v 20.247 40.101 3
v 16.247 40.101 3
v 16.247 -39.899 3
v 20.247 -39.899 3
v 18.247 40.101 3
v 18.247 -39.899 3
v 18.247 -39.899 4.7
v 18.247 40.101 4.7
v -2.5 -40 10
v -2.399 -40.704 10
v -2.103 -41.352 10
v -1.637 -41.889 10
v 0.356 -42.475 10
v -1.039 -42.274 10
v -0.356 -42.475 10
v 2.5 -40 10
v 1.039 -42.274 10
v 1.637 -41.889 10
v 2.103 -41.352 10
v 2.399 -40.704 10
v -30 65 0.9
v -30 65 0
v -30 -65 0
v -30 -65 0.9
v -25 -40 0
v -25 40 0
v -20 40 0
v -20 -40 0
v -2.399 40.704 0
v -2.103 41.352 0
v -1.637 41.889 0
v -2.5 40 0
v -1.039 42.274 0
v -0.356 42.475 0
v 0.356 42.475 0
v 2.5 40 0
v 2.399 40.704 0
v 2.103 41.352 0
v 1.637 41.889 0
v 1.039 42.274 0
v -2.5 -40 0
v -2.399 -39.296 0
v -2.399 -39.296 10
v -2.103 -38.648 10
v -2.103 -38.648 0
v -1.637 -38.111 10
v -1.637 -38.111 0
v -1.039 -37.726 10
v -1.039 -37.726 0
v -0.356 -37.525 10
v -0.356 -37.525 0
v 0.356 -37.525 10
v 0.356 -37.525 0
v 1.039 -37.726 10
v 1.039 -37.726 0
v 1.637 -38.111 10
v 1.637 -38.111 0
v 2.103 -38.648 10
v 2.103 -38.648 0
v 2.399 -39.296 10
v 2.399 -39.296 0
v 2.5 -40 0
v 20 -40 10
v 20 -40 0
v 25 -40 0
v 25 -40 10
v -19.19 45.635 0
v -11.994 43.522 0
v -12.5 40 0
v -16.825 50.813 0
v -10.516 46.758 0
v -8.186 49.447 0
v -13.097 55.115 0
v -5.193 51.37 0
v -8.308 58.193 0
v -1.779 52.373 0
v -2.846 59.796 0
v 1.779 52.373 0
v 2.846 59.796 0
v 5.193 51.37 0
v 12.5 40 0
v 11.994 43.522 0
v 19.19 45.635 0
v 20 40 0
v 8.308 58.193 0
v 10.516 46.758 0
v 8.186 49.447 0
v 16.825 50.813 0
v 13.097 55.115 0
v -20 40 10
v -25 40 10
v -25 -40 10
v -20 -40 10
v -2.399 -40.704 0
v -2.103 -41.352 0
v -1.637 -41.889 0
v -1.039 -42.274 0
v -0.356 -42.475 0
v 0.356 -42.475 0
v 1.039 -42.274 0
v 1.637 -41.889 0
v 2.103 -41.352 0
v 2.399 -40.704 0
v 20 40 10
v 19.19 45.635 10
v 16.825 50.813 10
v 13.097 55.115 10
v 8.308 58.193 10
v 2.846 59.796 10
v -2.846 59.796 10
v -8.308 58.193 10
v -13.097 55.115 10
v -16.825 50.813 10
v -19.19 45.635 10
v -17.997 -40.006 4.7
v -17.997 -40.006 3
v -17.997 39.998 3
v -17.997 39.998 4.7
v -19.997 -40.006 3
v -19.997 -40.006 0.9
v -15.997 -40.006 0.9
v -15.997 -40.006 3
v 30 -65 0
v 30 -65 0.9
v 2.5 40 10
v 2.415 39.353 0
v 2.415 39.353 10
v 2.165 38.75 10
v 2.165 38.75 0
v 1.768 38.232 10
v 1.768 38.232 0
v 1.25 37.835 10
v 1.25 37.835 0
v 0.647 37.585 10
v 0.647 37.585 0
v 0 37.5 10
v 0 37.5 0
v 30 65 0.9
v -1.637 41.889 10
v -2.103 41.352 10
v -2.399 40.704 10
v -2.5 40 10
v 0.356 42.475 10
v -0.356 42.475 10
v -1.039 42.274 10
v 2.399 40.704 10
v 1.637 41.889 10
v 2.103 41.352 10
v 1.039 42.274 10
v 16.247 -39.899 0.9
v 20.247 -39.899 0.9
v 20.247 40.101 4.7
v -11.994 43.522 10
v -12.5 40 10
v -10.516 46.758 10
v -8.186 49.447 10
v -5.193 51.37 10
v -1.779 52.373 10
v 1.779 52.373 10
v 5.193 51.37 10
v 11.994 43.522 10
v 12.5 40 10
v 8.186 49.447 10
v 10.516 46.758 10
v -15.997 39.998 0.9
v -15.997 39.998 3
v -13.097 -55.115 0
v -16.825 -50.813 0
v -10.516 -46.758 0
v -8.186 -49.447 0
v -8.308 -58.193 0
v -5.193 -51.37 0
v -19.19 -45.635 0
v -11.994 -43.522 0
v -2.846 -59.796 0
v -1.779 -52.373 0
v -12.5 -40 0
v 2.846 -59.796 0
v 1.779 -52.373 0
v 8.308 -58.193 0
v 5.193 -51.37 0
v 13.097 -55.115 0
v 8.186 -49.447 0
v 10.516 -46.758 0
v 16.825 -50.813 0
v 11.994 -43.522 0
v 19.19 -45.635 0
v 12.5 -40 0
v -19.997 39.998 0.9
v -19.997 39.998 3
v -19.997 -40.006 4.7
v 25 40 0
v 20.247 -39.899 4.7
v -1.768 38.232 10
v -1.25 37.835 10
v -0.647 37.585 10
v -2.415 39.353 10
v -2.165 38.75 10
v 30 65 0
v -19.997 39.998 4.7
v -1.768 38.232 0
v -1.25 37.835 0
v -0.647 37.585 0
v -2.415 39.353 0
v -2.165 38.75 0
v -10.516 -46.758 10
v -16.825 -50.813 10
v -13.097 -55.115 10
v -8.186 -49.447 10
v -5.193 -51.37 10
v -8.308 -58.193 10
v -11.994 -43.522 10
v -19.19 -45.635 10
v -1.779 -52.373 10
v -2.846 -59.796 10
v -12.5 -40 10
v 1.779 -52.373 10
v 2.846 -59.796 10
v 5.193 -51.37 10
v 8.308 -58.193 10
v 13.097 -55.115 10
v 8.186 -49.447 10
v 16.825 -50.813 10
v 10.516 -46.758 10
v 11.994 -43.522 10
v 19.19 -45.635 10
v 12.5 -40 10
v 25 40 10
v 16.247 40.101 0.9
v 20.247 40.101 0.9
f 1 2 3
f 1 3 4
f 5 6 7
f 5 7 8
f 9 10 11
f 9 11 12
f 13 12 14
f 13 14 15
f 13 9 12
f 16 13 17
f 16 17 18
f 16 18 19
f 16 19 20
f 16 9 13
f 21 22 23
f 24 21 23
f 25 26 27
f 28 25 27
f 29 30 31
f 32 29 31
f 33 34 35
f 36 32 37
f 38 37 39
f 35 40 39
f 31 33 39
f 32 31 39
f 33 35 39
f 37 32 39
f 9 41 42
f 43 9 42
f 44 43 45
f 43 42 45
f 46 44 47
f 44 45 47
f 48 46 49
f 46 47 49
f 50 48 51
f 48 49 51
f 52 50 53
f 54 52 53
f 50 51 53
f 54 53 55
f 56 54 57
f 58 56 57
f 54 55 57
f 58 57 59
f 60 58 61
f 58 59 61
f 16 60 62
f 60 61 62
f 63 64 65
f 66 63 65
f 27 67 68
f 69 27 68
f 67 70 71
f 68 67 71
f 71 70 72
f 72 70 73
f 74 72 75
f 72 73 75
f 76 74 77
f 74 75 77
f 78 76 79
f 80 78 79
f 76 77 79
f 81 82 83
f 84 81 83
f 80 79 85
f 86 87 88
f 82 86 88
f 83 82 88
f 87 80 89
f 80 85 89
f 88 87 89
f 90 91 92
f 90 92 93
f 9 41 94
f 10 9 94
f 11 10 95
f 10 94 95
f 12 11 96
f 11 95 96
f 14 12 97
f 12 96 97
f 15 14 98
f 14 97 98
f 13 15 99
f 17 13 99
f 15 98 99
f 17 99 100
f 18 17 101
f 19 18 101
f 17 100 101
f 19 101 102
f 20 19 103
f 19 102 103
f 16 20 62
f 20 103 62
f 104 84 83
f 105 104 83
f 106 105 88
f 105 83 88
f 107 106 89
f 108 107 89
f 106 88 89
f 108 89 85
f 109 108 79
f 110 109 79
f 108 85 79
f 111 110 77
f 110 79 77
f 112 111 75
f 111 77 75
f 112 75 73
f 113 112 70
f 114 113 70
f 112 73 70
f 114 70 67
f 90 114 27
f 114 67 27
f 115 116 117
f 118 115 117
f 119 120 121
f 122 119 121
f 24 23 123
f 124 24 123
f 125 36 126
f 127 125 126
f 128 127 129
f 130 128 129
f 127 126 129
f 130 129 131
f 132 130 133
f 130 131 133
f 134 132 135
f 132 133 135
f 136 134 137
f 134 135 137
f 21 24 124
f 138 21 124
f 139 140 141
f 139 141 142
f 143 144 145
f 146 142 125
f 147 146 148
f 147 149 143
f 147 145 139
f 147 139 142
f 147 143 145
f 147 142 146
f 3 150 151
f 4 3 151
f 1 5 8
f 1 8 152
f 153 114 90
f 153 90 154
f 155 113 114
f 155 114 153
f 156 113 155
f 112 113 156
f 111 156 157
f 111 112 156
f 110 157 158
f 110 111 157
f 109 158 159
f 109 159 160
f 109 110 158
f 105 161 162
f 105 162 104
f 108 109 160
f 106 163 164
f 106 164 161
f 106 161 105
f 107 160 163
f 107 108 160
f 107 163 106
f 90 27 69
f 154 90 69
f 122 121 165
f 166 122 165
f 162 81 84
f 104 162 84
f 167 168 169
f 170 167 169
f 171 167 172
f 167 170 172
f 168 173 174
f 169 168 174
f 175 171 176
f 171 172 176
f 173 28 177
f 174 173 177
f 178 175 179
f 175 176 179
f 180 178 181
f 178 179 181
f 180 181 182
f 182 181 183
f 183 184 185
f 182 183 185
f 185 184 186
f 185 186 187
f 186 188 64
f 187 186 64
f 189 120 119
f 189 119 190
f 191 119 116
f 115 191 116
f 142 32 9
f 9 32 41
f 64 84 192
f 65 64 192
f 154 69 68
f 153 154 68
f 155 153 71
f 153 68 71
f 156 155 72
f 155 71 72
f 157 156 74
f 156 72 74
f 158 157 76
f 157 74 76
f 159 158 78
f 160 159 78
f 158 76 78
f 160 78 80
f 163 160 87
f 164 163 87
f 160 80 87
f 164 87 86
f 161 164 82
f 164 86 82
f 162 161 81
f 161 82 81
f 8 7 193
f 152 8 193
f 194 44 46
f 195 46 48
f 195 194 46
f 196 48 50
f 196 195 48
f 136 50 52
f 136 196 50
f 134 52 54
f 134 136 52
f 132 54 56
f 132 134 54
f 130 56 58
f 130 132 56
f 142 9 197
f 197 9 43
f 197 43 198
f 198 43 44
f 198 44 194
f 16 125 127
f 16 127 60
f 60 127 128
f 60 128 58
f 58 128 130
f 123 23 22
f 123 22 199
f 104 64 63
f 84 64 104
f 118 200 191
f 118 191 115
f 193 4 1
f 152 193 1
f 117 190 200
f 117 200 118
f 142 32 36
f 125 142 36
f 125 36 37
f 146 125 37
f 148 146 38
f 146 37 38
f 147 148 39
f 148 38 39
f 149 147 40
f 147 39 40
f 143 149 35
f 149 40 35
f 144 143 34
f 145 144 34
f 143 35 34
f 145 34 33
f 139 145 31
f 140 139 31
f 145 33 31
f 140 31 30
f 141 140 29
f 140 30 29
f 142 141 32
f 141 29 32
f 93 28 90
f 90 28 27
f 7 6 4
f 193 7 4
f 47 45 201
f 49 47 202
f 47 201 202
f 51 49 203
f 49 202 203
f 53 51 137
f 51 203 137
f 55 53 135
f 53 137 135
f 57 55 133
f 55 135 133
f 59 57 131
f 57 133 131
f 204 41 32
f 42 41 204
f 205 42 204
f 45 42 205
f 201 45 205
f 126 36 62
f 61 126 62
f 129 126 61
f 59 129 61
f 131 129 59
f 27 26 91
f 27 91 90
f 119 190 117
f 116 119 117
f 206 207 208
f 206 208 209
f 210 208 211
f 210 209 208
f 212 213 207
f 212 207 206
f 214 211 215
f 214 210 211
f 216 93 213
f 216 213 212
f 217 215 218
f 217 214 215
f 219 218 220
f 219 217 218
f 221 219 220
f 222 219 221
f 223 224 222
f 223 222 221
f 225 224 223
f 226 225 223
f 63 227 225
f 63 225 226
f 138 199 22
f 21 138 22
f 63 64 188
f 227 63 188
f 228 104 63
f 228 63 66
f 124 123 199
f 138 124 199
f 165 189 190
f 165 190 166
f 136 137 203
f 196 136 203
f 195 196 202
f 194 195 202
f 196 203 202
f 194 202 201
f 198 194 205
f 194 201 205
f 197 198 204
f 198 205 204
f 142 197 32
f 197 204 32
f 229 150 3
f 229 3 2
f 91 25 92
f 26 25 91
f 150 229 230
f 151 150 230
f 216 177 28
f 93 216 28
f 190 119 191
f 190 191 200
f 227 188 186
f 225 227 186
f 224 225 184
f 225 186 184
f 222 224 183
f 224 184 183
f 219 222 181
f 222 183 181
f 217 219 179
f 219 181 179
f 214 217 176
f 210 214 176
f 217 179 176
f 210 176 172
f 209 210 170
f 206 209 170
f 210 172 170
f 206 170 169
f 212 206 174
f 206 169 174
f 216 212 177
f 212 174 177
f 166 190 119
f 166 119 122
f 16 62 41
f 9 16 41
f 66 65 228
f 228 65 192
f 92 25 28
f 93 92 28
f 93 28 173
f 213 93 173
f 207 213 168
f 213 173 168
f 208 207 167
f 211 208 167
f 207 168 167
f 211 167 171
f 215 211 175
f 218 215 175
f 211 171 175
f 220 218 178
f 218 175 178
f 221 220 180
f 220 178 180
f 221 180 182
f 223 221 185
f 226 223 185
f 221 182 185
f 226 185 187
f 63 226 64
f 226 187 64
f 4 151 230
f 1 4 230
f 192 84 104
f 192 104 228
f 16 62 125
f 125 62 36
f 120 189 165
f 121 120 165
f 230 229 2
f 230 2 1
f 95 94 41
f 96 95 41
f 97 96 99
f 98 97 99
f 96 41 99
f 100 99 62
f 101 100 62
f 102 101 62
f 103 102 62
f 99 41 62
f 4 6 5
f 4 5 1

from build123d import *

# Parameters (mm, degrees)
F2_DEPTH = 10
F0_W     = 5
F0_H     = 80
F3_W     = 25
F3_H     = 60
F4_DEPTH = 0.9
F5_W     = 4
F5_H     = 80
F6_DEPTH = 2.1
F5_H_2   = 80.0040699542
F8_W     = 2
F8_H     = 80
F9_DEPTH = 1.7
F7_W     = 2
F7_H     = 80.0040699542


with BuildPart() as f2:
    # F0 (on Top) → F2 (new body)
    with BuildSketch(Plane.XY):
        with BuildLine():
            ThreePointArc((-12.5, 40), (0, 52.5), (12.5, 40))
            Line((12.5, 40), (20, 40))
            ThreePointArc((20, 40), (0, 60), (-20, 40))
            Line((-20, 40), (-12.5, 40))
        make_face()
    extrude(amount=F2_DEPTH)


with BuildPart() as f2b:
    # F0 (on Top) → F2, piece 2 (new body)
    with BuildSketch(Plane.XY):
        with BuildLine():
            ThreePointArc((-20, -40), (0, -60), (20, -40))
            Line((20, -40), (14.4638279453, -40))
            Line((14.4638279453, -40), (12.5, -40))
            ThreePointArc((12.5, -40), (0, -52.5), (-12.5, -40))
            Line((-12.5, -40), (-20, -40))
        make_face()
    extrude(amount=F2_DEPTH)


with BuildPart() as f2c:
    # F0 (on Top) → F2, piece 3 (new body)
    with BuildSketch(Plane.XY):
        with Locations((22.5, 0)):
            Rectangle(F0_W, F0_H)
    extrude(amount=F2_DEPTH)


with BuildPart() as f2d:
    # F0 (on Top) → F2, piece 4 (new body)
    with BuildSketch(Plane.XY):
        with Locations((-22.5, 0)):
            Rectangle(F0_W, F0_H)
    extrude(amount=F2_DEPTH)


with BuildPart() as f2e:
    # F1 (on Top) → F2, piece 5 (new body)
    with BuildSketch(Plane.XY):
        with BuildLine():
            ThreePointArc((2.5, 40), (1.767766953, 38.232233047), (0, 37.5))
            ThreePointArc((0, 37.5), (-1.767766953, 38.232233047), (-2.5, 40))
            Line((-2.5, 40), (-2.5, -40))
            ThreePointArc((-2.5, -40), (0, -37.5), (2.5, -40))
            Line((2.5, -40), (2.5, 40))
        make_face()
    extrude(amount=F2_DEPTH)


with BuildPart() as f2f:
    # F1 (on Top) → F2, piece 6 (new body)
    with BuildSketch(Plane.XY):
        with BuildLine():
            Line((0, -40), (-2.5, -40))
            ThreePointArc((-2.5, -40), (0, -42.5), (2.5, -40))
            Line((2.5, -40), (0, -40))
        make_face()
    extrude(amount=F2_DEPTH)


with BuildPart() as f2g:
    # F1 (on Top) → F2, piece 7 (new body)
    with BuildSketch(Plane.XY):
        with BuildLine():
            Line((-2.5, 40), (0, 40))
            Line((0, 40), (2.5, 40))
            ThreePointArc((2.5, 40), (0, 42.5), (-2.5, 40))
        make_face()
    extrude(amount=F2_DEPTH)


with BuildPart() as f4:
    # F3 (on Top) → F4 (new body)
    with BuildSketch(Plane.XY):
        Polygon((25, 60), (25, 0), (30, 0), (30, 65), (25, 65), (0, 65), (0, 60), align=None)
        Polygon((30, 0), (25, 0), (25, -60), (0, -60), (-25, -60), (-25, 0), (-25, 60), (0, 60), (0, 65), (-25, 65), (-30, 65), (-30, -65), (-25, -65), (30, -65), align=None)
        with Locations((-12.5, -30)):
            Rectangle(F3_W, F3_H)
        with Locations((-12.5, 30)):
            Rectangle(F3_W, F3_H)
        with Locations((12.5, 30)):
            Rectangle(F3_W, F3_H)
        with Locations((12.5, -30)):
            Rectangle(F3_W, F3_H)
    extrude(amount=F4_DEPTH)


with BuildPart() as f6:
    # F5 (on face) → F6 (new body)
    with BuildSketch(Plane.XY.offset(0.9)):
        with Locations((18.247112304, 0.1008854806)):
            Rectangle(F5_W, F5_H)
    extrude(amount=F6_DEPTH)


with BuildPart() as f6b:
    # F5 (on face) → F6, piece 2 (new body)
    with BuildSketch(Plane.XY.offset(0.9)):
        with Locations((-17.9971620888, -0.0043641776)):
            Rectangle(F5_W, F5_H_2)
    extrude(amount=F6_DEPTH)


with BuildPart() as f9:
    # F8 (on face) → F9 (new body)
    with BuildSketch(Plane.XY.offset(3)):
        with Locations((19.247112304, 0.1008854806)):
            Rectangle(F8_W, F8_H)
    extrude(amount=F9_DEPTH)


with BuildPart() as f9b:
    # F7 (on face) → F9, piece 2 (new body)
    with BuildSketch(Plane.XY.offset(3)):
        with Locations((-18.9971620888, -0.0043641776)):
            Rectangle(F7_W, F7_H)
    extrude(amount=F9_DEPTH)


solid = Compound([f2.part, f2b.part, f2c.part, f2d.part, f2e.part, f2f.part, f2g.part, f4.part, f6.part, f6b.part, f9.part, f9b.part])
